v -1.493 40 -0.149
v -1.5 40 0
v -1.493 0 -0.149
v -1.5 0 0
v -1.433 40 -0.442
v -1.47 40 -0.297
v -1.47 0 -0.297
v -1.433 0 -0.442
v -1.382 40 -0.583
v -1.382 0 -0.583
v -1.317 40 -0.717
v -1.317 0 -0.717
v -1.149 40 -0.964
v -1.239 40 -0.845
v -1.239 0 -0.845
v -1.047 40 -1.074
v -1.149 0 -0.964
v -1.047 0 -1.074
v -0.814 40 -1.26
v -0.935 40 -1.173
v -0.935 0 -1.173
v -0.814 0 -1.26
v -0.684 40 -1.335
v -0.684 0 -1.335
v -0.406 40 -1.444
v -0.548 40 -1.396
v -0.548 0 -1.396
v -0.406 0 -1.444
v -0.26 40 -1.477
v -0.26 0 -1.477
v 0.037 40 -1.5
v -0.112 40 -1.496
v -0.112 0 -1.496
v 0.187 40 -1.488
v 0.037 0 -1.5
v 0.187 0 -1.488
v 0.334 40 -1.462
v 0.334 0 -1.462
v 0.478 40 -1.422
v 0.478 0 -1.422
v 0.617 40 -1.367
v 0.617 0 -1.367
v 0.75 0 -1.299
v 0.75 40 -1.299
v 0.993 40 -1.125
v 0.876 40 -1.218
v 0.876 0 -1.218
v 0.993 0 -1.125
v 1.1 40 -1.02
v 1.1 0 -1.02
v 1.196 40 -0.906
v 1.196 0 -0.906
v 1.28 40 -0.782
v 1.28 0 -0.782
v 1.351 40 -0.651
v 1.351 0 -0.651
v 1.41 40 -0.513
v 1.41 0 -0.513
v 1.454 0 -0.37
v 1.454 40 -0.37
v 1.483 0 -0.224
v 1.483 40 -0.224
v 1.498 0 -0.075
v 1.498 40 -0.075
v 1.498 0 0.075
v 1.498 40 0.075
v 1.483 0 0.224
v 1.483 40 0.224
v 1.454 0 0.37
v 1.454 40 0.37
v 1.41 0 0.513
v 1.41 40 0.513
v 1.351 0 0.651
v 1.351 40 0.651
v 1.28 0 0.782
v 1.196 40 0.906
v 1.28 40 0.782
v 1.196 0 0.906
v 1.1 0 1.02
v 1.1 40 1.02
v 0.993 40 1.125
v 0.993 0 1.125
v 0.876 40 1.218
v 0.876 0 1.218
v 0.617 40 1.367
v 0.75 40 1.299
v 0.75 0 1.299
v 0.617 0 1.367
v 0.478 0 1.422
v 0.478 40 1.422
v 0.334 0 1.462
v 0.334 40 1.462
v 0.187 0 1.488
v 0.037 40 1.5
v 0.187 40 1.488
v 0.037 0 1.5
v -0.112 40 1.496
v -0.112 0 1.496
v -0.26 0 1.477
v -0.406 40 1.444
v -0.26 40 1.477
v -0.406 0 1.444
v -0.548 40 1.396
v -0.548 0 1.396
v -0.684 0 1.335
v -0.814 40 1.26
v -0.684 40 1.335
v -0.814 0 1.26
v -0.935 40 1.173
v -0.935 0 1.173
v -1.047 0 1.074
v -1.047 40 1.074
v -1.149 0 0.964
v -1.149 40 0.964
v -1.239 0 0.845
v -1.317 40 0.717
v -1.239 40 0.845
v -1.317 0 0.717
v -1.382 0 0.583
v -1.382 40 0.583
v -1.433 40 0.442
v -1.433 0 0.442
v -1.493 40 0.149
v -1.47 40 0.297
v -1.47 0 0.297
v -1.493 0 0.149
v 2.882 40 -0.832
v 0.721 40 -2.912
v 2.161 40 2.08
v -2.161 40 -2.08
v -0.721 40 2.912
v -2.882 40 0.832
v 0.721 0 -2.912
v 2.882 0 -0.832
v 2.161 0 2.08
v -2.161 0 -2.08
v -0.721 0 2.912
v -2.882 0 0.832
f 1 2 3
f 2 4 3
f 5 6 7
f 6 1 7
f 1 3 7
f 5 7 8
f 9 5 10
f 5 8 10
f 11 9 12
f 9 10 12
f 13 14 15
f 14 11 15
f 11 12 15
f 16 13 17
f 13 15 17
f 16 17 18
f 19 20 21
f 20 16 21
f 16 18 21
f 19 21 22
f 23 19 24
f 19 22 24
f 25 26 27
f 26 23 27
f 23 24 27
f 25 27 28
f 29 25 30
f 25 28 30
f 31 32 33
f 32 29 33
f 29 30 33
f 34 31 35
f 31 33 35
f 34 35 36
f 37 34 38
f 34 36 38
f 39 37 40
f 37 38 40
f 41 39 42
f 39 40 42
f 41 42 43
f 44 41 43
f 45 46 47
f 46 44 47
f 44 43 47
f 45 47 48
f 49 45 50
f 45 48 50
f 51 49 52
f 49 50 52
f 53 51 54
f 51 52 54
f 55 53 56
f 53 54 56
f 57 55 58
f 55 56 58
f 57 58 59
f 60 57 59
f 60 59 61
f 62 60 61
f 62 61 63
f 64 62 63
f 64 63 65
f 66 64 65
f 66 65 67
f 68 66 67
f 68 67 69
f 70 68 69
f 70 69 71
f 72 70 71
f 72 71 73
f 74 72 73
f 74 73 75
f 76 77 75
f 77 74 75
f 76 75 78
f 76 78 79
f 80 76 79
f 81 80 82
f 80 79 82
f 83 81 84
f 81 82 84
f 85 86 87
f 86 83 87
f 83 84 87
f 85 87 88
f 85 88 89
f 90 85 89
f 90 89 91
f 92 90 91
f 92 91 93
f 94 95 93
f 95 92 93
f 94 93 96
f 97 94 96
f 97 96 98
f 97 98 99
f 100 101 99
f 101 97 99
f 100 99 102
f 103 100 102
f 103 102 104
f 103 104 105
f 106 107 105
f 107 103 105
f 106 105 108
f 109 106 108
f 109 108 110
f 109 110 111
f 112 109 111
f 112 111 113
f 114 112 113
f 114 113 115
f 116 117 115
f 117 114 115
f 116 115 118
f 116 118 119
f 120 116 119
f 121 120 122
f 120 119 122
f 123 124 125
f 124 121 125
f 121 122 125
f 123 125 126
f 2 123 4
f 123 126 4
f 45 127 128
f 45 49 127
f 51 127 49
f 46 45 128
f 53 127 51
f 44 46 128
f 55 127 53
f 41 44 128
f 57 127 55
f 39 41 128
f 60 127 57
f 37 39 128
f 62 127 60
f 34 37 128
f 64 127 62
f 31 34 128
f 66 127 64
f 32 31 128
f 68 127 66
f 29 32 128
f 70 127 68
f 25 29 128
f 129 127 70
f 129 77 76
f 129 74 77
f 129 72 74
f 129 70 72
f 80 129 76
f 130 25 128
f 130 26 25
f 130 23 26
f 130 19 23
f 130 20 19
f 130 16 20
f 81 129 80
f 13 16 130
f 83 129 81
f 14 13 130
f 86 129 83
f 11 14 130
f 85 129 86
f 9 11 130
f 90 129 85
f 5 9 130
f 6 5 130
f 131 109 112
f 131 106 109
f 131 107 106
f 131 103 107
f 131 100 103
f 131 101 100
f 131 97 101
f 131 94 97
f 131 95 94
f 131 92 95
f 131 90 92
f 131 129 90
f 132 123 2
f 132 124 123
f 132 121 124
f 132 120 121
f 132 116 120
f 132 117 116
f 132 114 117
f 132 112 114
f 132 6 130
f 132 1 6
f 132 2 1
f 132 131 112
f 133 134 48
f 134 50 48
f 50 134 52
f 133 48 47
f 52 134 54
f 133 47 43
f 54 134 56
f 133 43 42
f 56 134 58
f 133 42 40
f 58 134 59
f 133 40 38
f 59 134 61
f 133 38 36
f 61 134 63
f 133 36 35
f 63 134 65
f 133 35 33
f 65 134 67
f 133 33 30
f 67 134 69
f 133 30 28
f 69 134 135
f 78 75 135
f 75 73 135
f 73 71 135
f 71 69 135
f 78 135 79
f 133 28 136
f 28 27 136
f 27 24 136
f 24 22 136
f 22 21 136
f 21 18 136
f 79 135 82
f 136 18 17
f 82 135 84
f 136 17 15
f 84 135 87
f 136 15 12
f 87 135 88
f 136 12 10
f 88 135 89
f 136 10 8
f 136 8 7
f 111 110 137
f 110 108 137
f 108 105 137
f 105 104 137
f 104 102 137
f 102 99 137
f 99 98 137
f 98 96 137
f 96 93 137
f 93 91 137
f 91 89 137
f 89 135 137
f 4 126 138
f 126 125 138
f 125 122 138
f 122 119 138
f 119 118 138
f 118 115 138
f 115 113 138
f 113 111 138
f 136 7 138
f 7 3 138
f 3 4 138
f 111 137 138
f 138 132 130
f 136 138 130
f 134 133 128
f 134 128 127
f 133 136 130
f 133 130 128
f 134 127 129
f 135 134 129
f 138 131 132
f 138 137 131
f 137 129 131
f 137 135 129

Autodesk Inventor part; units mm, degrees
ref_plane "YZ Plane" through (0, 0, 0) normal (1, 0, 0) x (0, 1, 0)
ref_plane "XZ Plane" through (0, 0, 0) normal (0, 1, 0) x (-1, 0, 0)
ref_plane "XY Plane" through (0, 0, 0) normal (0, 0, 1) x (1, 0, 0)
sketch "Sketch1" plane through (0, 0, 0) normal (0, 1, 0) x (-1, 0, 0)
  circle A0 centre (0, 0) radius 1.5
  line L0 (-0.7211, -2.912) -> (-2.8825, -0.8315)
  line L1 (-2.8825, -0.8315) -> (-2.1614, 2.0805)
  line L2 (-2.1614, 2.0805) -> (0.7211, 2.912)
  line L3 (0.7211, 2.912) -> (2.8825, 0.8315)
  line L4 (2.8825, 0.8315) -> (2.1614, -2.0805)
  line L5 (2.1614, -2.0805) -> (-0.7211, -2.912)
  dimension "d0" = 3
  dimension "d1" = 6
extrude "Extrusion1" add sketch "Sketch1" along normal blind 40
thread "Thread1" size "M3x0.5" class "6H" standard "ANSI Metric M Profile" length 10
thread "Thread2" size "M3x0.5" class "6H" standard "ANSI Metric M Profile" length 10
properties part number "Spacer40"
